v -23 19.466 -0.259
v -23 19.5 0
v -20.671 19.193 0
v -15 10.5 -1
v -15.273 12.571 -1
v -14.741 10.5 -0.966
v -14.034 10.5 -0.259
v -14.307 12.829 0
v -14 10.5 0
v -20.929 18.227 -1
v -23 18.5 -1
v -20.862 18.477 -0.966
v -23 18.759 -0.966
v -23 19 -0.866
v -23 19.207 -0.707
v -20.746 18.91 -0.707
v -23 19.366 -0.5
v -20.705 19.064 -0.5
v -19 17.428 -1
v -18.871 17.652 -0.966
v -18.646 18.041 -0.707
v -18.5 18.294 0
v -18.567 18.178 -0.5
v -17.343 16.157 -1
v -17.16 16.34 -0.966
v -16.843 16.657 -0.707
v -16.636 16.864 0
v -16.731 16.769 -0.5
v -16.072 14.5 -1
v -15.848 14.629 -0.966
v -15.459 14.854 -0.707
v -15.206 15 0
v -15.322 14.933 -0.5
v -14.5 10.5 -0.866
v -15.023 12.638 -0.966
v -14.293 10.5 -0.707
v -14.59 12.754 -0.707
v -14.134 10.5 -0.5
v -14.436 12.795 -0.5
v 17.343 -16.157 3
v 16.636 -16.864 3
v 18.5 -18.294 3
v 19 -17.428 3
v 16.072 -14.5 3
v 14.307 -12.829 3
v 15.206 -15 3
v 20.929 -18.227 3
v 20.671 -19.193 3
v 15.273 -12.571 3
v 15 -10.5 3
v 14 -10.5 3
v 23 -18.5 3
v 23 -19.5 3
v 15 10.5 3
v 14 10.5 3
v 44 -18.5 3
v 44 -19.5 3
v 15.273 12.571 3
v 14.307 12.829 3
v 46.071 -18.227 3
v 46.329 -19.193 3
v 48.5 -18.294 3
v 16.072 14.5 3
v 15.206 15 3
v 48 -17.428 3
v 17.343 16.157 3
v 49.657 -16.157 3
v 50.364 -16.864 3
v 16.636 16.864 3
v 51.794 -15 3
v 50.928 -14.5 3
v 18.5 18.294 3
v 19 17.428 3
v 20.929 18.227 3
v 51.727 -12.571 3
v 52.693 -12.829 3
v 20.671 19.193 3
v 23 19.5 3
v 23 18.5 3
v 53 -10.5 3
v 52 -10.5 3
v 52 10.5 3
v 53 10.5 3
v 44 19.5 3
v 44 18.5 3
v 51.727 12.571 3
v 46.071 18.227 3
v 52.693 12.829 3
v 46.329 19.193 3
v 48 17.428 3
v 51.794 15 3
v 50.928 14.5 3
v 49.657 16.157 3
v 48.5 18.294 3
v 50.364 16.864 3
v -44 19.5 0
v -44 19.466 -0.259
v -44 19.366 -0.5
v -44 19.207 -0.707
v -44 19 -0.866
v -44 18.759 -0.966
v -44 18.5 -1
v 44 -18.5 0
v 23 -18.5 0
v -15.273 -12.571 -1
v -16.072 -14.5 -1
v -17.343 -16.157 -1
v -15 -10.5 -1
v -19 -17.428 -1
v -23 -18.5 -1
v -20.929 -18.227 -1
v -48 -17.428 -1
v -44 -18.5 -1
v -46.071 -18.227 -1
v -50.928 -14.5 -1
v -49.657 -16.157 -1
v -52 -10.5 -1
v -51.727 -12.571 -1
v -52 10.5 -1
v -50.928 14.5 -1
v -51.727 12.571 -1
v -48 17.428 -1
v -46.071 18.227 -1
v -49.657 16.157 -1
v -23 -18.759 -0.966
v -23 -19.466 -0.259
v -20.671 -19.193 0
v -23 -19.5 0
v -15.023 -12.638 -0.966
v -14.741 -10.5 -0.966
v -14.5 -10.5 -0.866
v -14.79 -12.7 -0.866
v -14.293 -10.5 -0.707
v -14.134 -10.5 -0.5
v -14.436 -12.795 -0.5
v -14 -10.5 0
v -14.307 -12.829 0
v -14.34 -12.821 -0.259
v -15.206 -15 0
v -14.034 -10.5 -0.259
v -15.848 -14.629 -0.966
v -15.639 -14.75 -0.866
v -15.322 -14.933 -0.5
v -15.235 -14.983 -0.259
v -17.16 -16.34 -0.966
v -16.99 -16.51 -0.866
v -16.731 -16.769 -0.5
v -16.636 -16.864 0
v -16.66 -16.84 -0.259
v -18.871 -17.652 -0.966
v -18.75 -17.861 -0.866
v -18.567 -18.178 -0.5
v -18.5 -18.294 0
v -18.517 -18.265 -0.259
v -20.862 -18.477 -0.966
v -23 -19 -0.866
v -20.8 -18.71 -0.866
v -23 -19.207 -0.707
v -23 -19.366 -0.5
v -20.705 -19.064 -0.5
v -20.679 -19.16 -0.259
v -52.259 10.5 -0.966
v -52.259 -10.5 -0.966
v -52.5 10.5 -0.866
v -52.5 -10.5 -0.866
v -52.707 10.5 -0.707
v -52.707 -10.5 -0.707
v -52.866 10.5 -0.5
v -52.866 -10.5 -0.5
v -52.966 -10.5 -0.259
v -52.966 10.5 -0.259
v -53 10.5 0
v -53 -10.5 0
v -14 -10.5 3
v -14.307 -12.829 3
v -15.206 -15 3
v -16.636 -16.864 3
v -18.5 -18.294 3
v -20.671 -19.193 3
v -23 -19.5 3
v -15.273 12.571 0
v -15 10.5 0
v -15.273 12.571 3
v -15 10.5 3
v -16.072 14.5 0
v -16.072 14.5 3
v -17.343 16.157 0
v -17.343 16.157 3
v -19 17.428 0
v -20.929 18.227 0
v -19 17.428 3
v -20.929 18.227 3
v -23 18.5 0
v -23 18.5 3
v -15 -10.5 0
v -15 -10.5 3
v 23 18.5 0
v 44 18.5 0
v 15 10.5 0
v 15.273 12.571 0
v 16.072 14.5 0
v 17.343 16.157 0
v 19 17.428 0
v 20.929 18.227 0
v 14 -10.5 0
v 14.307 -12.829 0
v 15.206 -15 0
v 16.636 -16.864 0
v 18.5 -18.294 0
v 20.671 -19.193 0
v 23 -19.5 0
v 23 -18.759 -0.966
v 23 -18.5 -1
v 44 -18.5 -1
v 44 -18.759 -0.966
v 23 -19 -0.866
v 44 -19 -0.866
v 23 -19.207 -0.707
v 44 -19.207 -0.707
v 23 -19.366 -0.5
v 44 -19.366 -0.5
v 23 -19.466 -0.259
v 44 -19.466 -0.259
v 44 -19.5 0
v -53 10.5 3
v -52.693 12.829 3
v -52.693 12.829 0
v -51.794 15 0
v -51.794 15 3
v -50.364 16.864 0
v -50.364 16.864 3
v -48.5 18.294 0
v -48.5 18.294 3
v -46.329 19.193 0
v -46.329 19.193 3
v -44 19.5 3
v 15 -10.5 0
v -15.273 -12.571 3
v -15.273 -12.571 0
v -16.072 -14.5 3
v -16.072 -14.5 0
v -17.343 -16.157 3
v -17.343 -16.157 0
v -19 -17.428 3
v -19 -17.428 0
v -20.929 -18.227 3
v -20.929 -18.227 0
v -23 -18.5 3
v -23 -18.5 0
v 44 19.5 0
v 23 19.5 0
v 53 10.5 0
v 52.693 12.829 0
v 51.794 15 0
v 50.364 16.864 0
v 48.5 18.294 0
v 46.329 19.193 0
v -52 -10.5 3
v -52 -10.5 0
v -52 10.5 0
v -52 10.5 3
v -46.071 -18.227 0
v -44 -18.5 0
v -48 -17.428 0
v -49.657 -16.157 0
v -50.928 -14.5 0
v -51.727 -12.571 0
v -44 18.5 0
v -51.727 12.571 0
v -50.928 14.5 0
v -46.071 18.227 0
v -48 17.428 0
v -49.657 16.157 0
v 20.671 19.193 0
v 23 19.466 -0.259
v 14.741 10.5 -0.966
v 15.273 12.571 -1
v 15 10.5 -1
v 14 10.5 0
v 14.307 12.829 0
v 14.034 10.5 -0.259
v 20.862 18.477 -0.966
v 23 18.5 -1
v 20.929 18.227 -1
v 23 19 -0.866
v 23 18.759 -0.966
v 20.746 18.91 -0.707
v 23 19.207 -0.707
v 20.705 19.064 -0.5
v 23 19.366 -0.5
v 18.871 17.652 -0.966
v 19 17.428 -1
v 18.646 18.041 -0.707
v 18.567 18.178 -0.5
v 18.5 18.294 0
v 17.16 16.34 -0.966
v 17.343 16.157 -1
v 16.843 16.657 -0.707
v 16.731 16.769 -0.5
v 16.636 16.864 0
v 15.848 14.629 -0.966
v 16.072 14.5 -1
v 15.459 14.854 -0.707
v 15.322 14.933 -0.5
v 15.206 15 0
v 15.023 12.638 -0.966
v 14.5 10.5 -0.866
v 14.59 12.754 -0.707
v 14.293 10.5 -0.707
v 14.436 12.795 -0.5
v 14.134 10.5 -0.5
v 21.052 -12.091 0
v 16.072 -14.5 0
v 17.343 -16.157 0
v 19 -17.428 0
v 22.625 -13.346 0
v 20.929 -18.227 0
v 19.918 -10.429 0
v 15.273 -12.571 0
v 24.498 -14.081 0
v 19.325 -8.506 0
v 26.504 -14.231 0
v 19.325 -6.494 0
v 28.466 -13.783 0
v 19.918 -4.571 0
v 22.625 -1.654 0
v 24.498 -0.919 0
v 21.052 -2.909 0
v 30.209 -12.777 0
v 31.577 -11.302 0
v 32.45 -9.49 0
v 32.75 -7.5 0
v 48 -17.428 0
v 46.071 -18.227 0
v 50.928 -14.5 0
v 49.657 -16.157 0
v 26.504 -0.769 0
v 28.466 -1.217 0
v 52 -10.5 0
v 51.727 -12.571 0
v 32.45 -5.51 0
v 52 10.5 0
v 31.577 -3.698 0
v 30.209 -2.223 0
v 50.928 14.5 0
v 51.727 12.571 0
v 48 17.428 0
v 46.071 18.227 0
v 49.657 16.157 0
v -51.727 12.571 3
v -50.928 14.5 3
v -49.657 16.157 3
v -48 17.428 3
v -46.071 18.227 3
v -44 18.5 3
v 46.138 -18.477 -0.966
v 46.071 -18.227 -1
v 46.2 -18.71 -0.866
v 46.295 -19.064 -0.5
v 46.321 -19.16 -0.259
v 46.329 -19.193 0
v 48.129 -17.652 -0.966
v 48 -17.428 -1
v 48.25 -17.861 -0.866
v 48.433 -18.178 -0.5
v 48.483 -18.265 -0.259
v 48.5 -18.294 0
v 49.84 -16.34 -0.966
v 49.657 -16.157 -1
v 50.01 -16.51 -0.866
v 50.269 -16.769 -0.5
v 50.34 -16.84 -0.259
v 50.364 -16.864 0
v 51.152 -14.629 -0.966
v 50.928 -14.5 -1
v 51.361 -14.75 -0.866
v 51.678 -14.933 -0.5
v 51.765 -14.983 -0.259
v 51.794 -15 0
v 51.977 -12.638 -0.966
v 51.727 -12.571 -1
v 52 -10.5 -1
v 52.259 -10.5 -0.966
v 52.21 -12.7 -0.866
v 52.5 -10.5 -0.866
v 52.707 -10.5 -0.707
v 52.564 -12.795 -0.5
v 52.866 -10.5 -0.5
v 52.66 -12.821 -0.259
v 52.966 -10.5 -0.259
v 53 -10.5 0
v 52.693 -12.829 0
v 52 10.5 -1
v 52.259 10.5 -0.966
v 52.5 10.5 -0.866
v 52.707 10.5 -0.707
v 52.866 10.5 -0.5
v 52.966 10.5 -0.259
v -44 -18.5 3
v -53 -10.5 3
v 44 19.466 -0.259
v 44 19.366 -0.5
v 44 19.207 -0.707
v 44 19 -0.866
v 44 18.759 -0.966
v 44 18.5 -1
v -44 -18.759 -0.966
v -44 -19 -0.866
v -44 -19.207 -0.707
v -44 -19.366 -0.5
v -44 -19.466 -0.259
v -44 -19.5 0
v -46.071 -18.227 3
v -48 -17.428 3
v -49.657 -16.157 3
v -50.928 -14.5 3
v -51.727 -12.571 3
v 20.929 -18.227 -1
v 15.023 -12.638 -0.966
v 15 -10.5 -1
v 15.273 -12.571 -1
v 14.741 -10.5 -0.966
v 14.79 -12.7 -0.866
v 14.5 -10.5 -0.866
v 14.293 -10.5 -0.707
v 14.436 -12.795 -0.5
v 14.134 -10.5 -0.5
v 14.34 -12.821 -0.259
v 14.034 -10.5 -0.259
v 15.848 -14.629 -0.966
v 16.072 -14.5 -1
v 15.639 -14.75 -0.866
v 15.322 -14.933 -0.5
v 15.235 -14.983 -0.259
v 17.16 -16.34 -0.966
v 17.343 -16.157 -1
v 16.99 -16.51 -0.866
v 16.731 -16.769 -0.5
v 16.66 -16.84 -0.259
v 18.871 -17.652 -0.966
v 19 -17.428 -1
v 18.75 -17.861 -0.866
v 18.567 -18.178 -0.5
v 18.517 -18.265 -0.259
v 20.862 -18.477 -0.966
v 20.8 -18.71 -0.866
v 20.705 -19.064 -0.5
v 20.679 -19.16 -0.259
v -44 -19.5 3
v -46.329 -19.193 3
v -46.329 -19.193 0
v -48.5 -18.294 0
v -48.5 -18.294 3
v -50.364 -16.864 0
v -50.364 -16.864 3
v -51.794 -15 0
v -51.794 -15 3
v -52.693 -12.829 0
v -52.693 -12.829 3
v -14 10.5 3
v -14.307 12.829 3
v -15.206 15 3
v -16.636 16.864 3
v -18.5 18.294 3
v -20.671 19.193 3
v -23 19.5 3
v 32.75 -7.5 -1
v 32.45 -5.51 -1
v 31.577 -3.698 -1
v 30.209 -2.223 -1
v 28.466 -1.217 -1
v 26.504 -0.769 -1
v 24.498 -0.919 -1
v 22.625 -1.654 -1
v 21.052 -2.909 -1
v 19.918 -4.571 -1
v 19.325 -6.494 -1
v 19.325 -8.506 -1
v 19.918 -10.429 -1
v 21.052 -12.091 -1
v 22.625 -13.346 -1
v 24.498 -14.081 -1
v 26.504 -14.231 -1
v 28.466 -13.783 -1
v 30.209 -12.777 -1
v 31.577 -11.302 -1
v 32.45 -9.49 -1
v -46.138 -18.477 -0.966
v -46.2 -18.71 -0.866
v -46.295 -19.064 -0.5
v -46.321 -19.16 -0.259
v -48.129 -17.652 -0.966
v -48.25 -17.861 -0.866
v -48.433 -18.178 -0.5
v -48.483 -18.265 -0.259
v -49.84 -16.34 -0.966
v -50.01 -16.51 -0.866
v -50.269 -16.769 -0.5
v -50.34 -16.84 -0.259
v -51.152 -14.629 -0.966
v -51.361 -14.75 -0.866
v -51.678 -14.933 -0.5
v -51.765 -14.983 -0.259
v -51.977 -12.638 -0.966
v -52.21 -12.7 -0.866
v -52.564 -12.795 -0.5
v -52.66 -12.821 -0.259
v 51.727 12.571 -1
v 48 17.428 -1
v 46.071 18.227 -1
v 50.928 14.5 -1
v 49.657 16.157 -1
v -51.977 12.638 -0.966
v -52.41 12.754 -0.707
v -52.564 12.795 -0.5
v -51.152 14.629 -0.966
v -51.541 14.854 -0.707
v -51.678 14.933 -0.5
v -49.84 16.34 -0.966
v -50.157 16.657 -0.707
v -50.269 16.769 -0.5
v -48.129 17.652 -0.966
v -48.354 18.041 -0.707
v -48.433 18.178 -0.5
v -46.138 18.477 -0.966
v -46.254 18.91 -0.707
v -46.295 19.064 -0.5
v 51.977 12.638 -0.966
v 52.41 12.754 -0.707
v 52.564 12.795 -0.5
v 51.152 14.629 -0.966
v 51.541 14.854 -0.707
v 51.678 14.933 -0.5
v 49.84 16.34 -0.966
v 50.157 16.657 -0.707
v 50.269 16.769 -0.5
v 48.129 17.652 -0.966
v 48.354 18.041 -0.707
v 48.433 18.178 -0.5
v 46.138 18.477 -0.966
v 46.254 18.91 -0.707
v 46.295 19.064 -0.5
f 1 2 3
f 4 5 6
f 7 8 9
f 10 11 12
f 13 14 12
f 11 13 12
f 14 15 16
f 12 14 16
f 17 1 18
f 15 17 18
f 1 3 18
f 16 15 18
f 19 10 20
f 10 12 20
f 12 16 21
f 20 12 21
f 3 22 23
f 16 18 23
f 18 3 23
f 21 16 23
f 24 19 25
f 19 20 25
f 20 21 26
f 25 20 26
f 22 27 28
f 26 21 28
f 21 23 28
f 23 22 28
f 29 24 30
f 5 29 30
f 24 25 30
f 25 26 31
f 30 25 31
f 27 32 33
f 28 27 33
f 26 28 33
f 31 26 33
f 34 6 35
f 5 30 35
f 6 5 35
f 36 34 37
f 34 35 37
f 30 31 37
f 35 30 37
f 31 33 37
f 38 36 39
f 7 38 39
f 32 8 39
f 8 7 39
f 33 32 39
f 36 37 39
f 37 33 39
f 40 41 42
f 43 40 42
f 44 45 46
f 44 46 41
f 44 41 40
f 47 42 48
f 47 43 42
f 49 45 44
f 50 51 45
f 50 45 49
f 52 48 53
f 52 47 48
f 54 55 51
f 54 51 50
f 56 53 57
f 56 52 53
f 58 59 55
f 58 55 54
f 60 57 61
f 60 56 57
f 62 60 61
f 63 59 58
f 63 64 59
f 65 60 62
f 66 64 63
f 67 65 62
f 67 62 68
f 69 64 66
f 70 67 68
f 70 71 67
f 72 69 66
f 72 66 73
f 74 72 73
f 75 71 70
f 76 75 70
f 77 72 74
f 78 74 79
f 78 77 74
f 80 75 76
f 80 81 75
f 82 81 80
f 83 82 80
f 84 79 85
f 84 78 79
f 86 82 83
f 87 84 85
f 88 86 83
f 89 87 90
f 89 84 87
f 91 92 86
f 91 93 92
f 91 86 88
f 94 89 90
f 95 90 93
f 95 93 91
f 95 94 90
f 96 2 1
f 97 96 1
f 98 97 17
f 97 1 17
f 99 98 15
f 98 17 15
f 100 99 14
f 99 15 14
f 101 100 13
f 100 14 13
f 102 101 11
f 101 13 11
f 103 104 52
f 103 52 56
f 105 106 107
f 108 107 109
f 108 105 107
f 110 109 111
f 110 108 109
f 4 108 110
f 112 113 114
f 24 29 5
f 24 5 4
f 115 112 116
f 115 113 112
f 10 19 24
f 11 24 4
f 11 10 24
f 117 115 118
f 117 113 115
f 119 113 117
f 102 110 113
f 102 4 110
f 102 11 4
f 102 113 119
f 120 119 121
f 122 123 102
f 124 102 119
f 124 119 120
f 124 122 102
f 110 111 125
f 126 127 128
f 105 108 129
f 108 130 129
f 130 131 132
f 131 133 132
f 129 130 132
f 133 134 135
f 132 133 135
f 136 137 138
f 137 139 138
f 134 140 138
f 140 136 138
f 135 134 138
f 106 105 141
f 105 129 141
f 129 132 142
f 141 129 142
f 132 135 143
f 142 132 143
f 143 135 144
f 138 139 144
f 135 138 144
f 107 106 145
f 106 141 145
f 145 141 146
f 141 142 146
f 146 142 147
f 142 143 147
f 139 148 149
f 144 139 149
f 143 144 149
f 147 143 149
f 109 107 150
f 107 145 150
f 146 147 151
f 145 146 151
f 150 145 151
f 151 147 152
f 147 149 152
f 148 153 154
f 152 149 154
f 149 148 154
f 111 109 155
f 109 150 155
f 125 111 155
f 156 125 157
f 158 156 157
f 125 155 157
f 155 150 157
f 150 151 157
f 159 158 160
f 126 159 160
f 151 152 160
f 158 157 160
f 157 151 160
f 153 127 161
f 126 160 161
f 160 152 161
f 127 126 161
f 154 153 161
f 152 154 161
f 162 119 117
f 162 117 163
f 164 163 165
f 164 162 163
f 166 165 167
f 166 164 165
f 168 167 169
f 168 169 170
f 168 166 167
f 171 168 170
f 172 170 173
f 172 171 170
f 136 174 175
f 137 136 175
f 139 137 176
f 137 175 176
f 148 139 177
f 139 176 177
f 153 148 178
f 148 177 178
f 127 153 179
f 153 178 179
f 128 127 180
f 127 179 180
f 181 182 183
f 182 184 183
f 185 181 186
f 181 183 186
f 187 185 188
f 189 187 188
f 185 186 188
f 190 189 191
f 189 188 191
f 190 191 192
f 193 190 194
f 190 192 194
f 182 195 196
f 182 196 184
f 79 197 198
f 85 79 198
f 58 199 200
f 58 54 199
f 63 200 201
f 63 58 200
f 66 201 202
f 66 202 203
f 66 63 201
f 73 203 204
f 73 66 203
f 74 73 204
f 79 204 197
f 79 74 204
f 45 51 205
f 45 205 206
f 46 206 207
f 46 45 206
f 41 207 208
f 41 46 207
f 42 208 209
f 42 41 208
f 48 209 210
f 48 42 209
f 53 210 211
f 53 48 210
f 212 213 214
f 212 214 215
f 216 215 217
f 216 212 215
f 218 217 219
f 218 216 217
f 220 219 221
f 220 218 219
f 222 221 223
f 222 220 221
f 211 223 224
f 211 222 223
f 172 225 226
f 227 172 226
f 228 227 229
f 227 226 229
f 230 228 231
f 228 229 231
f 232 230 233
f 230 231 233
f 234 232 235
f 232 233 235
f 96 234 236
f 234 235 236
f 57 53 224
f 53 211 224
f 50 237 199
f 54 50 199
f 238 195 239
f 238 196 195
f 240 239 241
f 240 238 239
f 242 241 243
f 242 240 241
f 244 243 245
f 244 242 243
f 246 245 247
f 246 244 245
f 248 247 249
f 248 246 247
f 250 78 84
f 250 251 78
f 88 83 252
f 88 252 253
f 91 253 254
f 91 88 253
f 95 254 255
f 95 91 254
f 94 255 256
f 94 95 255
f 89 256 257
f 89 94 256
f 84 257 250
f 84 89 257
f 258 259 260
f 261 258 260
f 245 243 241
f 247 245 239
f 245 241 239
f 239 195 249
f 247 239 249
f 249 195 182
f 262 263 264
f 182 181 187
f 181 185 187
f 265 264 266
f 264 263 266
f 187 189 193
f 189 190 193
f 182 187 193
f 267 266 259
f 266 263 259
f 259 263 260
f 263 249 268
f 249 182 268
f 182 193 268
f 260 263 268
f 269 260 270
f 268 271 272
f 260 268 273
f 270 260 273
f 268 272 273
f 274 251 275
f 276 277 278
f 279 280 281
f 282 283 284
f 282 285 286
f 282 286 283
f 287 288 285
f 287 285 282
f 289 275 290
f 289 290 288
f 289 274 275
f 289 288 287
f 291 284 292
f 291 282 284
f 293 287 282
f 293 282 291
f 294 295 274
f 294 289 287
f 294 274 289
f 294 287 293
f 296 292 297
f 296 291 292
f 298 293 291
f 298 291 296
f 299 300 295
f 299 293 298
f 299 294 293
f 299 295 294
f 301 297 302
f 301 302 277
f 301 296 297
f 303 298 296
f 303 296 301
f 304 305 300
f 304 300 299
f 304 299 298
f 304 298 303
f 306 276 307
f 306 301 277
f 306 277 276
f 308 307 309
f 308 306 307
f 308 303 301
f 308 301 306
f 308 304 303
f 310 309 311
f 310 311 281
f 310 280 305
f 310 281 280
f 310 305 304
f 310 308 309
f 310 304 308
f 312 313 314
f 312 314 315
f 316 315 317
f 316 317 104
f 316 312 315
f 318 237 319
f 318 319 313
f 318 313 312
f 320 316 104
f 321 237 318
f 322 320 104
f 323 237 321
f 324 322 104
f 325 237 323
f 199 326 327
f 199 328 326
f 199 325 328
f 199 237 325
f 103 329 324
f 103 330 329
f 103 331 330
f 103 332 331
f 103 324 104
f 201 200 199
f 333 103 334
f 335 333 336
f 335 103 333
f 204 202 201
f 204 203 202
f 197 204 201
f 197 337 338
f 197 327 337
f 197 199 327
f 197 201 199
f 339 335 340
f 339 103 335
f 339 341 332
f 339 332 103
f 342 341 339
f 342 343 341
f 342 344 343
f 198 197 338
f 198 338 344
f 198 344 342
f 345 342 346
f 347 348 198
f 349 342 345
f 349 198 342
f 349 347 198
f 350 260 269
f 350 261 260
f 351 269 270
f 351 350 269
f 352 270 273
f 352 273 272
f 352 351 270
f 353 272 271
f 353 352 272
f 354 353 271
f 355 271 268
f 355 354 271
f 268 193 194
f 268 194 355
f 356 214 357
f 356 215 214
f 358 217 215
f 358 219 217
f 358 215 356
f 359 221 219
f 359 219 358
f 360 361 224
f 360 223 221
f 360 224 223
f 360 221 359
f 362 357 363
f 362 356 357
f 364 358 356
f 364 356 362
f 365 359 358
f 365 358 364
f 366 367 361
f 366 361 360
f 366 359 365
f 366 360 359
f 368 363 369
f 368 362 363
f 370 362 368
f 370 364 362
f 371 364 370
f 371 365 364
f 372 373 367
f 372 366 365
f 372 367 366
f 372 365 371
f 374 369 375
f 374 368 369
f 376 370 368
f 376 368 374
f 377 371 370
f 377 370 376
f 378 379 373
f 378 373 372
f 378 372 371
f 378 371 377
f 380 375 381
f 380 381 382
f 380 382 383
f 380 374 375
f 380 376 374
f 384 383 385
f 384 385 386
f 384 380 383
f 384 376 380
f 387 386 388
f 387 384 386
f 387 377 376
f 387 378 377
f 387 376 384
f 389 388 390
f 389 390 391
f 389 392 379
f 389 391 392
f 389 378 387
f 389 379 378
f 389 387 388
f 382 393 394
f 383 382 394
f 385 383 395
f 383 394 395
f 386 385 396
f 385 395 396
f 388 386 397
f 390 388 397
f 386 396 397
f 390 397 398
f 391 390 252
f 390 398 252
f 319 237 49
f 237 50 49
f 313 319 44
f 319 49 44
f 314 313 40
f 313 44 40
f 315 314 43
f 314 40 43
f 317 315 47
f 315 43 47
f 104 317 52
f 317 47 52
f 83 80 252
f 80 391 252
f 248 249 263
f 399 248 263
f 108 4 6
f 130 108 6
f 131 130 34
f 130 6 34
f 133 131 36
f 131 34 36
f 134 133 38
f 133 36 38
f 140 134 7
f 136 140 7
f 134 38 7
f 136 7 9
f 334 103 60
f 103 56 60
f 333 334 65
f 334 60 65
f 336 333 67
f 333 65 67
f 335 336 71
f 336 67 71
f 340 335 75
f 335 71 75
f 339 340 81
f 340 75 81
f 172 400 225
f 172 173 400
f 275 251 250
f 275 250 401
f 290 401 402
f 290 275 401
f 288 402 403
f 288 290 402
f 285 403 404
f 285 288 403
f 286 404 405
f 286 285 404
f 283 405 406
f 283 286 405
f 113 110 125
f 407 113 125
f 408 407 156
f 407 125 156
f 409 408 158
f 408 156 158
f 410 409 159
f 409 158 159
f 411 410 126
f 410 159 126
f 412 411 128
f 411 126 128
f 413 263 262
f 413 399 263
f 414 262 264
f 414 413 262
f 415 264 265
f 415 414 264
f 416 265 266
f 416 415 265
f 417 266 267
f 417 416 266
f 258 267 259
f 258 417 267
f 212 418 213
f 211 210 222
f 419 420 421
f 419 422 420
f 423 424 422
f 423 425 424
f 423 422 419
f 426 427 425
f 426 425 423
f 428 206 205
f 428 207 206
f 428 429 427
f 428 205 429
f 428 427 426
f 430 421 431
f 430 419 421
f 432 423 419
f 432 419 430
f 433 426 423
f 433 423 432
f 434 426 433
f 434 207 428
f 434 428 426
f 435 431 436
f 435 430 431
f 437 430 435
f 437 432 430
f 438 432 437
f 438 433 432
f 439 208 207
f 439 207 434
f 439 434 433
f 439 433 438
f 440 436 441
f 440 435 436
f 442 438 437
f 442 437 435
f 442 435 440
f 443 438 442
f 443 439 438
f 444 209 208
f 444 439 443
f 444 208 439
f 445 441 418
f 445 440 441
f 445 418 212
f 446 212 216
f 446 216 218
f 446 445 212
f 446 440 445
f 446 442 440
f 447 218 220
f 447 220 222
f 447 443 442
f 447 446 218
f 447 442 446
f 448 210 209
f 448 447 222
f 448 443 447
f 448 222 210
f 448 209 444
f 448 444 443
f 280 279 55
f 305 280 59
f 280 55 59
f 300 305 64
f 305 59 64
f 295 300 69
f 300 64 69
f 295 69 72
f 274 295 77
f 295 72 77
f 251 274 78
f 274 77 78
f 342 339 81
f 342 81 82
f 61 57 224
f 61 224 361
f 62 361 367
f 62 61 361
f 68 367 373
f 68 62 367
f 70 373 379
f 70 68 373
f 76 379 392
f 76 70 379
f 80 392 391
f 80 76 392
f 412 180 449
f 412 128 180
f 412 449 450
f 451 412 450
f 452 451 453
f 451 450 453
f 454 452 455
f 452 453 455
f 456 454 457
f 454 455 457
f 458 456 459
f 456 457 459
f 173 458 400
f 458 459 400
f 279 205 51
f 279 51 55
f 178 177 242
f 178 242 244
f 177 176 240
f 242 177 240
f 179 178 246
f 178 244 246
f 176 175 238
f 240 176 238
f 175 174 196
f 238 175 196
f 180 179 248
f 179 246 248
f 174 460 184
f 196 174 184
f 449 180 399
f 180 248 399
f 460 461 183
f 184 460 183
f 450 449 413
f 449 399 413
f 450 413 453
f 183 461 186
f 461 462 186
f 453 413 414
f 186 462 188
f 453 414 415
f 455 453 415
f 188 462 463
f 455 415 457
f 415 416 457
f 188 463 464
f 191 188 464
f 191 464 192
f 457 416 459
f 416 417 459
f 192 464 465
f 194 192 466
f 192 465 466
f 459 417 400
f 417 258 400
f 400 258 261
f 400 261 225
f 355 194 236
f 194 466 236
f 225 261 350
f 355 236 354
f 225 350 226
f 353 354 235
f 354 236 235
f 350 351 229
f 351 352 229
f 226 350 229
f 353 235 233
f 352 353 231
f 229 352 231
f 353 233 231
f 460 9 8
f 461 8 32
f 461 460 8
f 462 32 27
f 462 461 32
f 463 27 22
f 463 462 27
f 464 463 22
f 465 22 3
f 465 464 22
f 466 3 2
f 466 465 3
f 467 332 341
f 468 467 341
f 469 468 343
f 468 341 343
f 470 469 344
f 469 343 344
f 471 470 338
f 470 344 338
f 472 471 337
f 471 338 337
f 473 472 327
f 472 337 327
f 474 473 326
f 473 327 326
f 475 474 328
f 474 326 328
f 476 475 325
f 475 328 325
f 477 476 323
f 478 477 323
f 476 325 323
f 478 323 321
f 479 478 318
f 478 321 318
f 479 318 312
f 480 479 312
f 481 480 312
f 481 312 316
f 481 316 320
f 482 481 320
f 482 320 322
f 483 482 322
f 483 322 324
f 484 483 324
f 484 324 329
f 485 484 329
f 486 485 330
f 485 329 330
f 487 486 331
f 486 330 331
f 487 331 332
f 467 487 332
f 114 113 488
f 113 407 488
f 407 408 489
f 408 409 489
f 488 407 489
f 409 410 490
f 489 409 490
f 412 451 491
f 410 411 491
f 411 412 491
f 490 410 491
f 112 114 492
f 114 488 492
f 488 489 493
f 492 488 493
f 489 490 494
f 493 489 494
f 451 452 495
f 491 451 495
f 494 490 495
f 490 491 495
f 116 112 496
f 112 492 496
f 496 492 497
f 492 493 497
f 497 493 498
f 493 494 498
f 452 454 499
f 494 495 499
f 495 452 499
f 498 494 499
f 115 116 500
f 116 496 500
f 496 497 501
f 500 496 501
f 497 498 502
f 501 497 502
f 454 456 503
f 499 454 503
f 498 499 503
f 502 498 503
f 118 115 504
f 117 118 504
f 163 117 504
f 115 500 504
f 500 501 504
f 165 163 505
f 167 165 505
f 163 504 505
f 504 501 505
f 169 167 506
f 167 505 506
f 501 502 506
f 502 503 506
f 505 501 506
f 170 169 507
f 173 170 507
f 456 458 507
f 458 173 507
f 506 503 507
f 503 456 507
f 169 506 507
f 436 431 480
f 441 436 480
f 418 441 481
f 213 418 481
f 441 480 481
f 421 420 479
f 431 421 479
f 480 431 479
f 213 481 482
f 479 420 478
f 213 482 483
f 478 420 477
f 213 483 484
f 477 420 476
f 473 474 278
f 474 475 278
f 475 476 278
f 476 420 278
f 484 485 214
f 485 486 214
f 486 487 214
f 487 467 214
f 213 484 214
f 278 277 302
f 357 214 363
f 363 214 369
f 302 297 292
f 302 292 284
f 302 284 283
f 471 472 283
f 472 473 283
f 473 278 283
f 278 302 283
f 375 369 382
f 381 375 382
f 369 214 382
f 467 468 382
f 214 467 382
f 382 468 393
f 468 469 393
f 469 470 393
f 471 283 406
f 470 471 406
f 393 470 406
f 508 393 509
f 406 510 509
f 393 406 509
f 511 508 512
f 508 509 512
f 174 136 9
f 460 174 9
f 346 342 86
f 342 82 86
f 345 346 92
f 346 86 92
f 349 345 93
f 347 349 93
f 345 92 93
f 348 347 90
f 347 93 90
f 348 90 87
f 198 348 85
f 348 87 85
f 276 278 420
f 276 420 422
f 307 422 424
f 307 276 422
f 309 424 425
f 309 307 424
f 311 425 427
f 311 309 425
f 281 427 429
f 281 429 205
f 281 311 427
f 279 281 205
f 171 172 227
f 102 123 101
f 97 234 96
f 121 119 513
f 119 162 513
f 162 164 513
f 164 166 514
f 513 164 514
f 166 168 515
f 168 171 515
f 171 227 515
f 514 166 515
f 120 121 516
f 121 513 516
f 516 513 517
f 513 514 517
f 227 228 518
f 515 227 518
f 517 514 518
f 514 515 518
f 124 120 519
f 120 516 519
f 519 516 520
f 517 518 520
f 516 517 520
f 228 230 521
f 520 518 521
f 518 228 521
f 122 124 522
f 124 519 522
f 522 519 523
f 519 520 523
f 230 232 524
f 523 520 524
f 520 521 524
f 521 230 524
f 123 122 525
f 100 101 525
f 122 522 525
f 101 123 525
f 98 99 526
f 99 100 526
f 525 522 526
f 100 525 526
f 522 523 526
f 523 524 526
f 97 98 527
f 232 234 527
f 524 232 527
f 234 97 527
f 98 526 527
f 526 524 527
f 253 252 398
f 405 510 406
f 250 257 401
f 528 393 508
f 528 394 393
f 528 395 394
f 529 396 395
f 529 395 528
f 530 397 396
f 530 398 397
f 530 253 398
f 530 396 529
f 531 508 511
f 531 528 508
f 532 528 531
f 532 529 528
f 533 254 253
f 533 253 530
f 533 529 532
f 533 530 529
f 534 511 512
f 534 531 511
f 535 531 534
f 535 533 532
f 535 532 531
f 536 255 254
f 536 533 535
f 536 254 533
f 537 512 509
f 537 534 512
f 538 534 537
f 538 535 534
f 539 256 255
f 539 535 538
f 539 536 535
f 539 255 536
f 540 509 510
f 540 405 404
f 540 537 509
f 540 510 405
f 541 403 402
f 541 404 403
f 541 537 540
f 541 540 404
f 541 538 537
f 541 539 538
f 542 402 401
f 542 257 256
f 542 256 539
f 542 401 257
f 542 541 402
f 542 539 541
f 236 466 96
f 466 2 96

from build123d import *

# Parameters (mm, degrees)
F0_W         = 37
F0_H         = 37
F1_DEPTH     = 3
F2_R         = 8
F3_T         = 1
F4_T1_DEPTH  = 21
F4_T3_DEPTH  = 21
F4_T6_ANGLE  = 90
F4_T8_ANGLE  = 90
F4_T10_ANGLE = 90
F4_T12_ANGLE = 90
F6_R         = 6.75
F7_DEPTH     = 1


# Not quite as in the source:
# - a fillet or chamfer that OpenCascade refuses, or shapes differently, is made with other operations: its cross-section is extruded or revolved along the edge and cut away or added


with BuildPart() as f1:
    # F0 (on Top) → F1 (new body)
    with BuildSketch(Plane.XY):
        with Locations((33.5, 0)):
            Rectangle(F0_W, F0_H)
    extrude(amount=F1_DEPTH)

    # F2
    f2_edges = [f1.edges().sort_by_distance(p)[0] for p in [
        (15, 18.5, 1.5),
        (52, 18.5, 1.5),
        (52, -18.5, 1.5),
        (15, -18.5, 1.5),
    ]]
    fillet(f2_edges, radius=F2_R)

    # F3
    f3_openings = [f1.faces().sort_by_distance(p)[0] for p in [
        (33.5, 0, 3),
    ]]
    offset(amount=F3_T, openings=f3_openings, kind=Kind.INTERSECTION)

    # F4: fillet of radius 1 on 8 edges, made by hand

    # F4_s2 → F4_t1 (cut)
    with BuildSketch(Plane.YZ.offset(23)):
        with BuildLine():
            ThreePointArc((19.5, 0), (19.2071067812, -0.7071067812), (18.5, -1))
            Line((18.5, -1), (19.5, -1))
            Line((19.5, -1), (19.5, 0))
        make_face()
        with BuildLine():
            ThreePointArc((-18.5, -1), (-19.2071067812, -0.7071067812), (-19.5, 0))
            Line((-19.5, 0), (-19.5, -1))
            Line((-19.5, -1), (-18.5, -1))
        make_face()
    extrude(amount=F4_T1_DEPTH, mode=Mode.SUBTRACT)

    # F4_s4 → F4_t3 (cut)
    with BuildSketch(Plane.XZ.offset(-10.5)):
        with BuildLine():
            ThreePointArc((15, -1), (14.2928932188, -0.7071067812), (14, 0))
            Line((14, 0), (14, -1))
            Line((14, -1), (15, -1))
        make_face()
        with BuildLine():
            ThreePointArc((52, -1), (52.7071067812, -0.7071067812), (53, 0))
            Line((53, 0), (53, -1))
            Line((53, -1), (52, -1))
        make_face()
    extrude(amount=F4_T3_DEPTH, mode=Mode.SUBTRACT)

    # F4_s5 → F4_t6 (revolve, cut)
    with BuildSketch(Plane.XZ.offset(-10.5)):
        with BuildLine():
            ThreePointArc((52, -1), (52.7071067812, -0.7071067812), (53, 0))
            Line((53, 0), (53, -1))
            Line((53, -1), (52, -1))
        make_face()
    revolve(axis=Axis((44, 10.5, -1), (0, 0, 1)), revolution_arc=F4_T6_ANGLE, mode=Mode.SUBTRACT)

    # F4_s7 → F4_t8 (revolve, cut)
    with BuildSketch(Plane.YZ.offset(23)):
        with BuildLine():
            ThreePointArc((18.5, -1), (19.2071067812, -0.7071067812), (19.5, 0))
            Line((19.5, 0), (19.5, -1))
            Line((19.5, -1), (18.5, -1))
        make_face()
    revolve(axis=Axis((23, 10.5, -1), (0, 0, 1)), revolution_arc=F4_T8_ANGLE, mode=Mode.SUBTRACT)

    # F4_s9 → F4_t10 (revolve, cut)
    with BuildSketch(Plane.XZ.offset(10.5)):
        with BuildLine():
            ThreePointArc((15, -1), (14.2928932188, -0.7071067812), (14, 0))
            Line((14, 0), (14, -1))
            Line((14, -1), (15, -1))
        make_face()
    revolve(axis=Axis((23, -10.5, -1), (0, 0, 1)), revolution_arc=F4_T10_ANGLE, mode=Mode.SUBTRACT)

    # F4_s11 → F4_t12 (revolve, cut)
    with BuildSketch(Plane.YZ.offset(44)):
        with BuildLine():
            ThreePointArc((-18.5, -1), (-19.2071067812, -0.7071067812), (-19.5, 0))
            Line((-19.5, 0), (-19.5, -1))
            Line((-19.5, -1), (-18.5, -1))
        make_face()
    revolve(axis=Axis((44, -10.5, -1), (0, 0, 1)), revolution_arc=F4_T12_ANGLE, mode=Mode.SUBTRACT)


with BuildPart() as f5_1:
    # F5: instance of F1
    add(f1.part.mirror(Plane.YZ))


with BuildPart() as f1_1:
    add(f1.part)

    # F6 (on face) → F7 (cut, through all)
    with BuildSketch(Plane.XY):
        with Locations((26, -7.5)):
            Circle(F6_R)
    extrude(amount=-F7_DEPTH, mode=Mode.SUBTRACT)


solid = Compound([f5_1.part, f1_1.part])
